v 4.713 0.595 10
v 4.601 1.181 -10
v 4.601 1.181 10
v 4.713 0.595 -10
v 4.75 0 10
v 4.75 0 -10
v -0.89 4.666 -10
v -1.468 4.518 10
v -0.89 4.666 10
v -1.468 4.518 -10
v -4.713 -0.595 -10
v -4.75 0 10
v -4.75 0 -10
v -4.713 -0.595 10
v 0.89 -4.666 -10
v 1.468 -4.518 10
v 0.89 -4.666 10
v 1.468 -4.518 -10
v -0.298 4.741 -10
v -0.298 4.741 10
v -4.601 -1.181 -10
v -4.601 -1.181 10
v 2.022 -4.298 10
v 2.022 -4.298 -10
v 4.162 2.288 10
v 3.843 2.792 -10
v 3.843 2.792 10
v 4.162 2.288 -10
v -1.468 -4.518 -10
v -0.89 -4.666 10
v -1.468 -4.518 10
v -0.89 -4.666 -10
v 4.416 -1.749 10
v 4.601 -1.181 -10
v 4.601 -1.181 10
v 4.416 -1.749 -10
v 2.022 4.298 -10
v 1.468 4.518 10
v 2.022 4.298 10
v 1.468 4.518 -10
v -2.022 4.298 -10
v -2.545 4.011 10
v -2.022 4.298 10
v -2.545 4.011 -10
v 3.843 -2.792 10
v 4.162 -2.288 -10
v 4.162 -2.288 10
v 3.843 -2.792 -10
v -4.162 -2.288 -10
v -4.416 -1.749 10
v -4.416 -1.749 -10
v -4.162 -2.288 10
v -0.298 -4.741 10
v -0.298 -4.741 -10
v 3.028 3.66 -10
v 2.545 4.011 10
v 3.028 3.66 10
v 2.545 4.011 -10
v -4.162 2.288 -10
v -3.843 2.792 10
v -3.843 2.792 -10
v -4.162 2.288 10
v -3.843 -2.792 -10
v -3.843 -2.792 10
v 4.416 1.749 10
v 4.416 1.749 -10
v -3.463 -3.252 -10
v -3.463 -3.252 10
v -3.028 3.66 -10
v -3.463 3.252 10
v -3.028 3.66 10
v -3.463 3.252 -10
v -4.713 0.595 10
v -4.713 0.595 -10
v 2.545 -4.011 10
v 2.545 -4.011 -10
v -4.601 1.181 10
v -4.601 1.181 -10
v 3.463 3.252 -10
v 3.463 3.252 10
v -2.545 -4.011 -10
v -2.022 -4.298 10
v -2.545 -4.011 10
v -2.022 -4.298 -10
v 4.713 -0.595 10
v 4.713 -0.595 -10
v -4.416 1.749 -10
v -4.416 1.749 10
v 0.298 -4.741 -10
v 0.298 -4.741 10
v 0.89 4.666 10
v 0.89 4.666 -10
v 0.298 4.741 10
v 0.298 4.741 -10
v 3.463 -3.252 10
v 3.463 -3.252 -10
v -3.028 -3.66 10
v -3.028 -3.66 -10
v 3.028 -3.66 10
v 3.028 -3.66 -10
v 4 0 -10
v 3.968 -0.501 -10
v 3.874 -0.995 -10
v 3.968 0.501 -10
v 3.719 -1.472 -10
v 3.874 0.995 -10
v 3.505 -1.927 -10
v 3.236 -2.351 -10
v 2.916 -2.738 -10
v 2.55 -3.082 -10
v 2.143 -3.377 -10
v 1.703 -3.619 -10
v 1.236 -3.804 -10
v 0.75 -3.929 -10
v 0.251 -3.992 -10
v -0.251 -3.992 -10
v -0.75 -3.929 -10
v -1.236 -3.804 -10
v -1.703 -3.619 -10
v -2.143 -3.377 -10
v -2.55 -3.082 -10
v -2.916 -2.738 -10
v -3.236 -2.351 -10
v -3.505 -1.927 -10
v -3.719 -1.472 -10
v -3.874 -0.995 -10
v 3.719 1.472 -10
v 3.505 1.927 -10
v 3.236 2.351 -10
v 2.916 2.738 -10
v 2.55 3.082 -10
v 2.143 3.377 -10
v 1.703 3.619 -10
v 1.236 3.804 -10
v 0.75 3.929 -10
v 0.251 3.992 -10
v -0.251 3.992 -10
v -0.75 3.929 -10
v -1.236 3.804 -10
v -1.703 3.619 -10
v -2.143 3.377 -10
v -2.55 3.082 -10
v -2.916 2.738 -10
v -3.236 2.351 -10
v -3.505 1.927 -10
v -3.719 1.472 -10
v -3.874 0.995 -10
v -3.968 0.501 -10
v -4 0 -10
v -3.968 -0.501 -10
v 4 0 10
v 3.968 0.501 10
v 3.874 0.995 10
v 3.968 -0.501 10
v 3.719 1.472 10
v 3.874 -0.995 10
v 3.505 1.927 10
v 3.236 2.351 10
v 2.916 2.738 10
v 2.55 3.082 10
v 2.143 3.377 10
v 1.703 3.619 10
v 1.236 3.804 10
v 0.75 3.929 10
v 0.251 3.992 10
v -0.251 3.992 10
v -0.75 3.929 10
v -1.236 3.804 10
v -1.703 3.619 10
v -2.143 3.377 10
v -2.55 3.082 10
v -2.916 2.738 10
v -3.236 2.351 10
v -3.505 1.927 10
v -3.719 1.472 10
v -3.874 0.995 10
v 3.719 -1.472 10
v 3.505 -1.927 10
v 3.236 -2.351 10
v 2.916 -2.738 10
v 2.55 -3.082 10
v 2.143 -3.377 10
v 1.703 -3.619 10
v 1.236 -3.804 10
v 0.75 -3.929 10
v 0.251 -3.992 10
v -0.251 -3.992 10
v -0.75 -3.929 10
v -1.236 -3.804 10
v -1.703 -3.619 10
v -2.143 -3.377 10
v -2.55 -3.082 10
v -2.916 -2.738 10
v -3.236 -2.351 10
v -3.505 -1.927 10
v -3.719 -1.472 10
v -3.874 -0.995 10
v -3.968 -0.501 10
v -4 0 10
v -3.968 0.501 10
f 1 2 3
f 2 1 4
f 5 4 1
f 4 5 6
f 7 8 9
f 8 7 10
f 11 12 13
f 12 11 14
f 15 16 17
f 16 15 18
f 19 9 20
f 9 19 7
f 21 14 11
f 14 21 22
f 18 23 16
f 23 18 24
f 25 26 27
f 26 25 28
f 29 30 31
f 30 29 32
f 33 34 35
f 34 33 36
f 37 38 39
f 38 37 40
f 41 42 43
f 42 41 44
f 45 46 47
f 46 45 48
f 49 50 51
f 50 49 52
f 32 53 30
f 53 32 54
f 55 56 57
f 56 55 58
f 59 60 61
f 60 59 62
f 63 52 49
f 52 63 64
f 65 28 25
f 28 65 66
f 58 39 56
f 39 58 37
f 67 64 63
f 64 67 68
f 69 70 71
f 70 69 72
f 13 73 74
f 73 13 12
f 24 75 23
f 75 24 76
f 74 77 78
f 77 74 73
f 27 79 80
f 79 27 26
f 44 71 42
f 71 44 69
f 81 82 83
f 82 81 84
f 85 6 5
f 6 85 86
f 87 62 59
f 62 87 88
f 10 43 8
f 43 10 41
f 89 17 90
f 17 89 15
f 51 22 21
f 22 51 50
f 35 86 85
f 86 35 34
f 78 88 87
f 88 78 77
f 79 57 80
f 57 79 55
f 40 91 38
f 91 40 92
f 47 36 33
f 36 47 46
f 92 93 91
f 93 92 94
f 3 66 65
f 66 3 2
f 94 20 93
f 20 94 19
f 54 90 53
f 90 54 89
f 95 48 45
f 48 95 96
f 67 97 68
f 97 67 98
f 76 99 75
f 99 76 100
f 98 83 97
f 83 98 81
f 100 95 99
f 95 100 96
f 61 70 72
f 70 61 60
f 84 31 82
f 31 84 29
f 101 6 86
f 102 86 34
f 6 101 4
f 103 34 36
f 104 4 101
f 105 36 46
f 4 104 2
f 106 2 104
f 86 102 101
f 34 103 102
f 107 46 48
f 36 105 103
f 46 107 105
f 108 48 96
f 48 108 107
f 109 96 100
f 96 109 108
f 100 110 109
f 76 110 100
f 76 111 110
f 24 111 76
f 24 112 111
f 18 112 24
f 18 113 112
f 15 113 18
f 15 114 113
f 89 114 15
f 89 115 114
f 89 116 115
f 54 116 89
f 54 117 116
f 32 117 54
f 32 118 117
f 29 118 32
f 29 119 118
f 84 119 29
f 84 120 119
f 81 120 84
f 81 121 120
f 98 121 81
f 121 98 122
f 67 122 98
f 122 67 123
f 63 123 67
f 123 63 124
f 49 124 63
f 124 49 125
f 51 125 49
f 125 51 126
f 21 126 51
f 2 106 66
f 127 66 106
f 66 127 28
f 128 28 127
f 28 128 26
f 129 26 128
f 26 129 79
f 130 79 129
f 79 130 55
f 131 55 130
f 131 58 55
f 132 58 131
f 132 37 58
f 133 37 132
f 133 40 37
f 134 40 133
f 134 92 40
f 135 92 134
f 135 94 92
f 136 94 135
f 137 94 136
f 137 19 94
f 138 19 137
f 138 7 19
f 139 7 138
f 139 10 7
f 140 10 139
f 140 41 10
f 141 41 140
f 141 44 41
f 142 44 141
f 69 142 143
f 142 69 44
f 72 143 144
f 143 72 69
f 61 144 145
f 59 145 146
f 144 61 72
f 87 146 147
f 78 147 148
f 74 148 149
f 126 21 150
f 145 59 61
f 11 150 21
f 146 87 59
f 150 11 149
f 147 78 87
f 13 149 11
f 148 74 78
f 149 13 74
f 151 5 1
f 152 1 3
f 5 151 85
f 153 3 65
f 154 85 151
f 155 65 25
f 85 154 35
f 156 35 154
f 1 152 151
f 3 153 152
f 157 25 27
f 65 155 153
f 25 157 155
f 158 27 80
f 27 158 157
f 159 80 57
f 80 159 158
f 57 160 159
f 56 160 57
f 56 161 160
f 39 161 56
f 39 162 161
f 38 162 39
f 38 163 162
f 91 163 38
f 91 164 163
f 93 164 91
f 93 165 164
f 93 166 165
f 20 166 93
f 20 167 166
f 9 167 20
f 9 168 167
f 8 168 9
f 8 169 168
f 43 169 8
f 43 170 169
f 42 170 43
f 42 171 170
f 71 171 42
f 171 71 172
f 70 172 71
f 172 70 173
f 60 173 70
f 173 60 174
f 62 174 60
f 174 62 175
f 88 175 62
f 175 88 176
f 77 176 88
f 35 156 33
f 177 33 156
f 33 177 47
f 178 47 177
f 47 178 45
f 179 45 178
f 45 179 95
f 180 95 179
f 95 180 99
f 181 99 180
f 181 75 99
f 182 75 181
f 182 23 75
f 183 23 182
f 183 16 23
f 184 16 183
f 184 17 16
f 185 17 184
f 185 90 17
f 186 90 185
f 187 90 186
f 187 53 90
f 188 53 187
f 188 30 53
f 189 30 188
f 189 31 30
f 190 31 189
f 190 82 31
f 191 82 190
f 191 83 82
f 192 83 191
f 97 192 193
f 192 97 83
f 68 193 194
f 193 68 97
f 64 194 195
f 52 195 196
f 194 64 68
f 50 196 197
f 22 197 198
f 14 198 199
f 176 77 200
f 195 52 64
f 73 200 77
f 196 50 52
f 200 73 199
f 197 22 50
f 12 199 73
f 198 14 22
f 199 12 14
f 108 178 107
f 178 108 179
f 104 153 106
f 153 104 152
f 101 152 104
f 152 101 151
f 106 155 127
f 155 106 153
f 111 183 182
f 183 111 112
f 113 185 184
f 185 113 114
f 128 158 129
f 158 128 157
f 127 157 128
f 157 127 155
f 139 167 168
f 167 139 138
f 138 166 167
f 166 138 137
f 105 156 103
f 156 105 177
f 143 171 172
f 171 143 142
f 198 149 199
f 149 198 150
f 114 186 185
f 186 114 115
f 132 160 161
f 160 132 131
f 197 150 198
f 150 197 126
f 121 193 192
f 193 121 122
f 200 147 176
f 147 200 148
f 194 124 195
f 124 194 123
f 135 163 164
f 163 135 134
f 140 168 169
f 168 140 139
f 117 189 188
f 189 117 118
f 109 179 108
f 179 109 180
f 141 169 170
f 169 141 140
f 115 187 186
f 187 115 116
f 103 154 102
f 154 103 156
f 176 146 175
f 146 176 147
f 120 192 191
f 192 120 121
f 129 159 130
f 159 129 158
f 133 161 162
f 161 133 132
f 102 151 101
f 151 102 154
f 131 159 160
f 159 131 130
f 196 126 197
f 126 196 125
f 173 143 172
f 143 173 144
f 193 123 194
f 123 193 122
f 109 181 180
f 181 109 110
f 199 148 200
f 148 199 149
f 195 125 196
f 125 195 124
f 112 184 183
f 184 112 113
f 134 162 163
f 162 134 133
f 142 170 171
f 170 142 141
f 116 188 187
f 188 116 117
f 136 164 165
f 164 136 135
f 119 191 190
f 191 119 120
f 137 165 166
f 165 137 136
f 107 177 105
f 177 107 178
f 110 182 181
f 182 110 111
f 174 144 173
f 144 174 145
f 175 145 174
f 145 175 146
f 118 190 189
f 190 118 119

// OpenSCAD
$fn = 50;


difference() {
	union() {
		translate(v = [0, 0, -10.0000000000]) {
			cylinder(h = 20, r = 4.7500000000);
		}
	}
	union() {
		translate(v = [0, 0, -100.0000000000]) {
			cylinder(h = 200, r = 4.0000000000);
		}
	}
}
